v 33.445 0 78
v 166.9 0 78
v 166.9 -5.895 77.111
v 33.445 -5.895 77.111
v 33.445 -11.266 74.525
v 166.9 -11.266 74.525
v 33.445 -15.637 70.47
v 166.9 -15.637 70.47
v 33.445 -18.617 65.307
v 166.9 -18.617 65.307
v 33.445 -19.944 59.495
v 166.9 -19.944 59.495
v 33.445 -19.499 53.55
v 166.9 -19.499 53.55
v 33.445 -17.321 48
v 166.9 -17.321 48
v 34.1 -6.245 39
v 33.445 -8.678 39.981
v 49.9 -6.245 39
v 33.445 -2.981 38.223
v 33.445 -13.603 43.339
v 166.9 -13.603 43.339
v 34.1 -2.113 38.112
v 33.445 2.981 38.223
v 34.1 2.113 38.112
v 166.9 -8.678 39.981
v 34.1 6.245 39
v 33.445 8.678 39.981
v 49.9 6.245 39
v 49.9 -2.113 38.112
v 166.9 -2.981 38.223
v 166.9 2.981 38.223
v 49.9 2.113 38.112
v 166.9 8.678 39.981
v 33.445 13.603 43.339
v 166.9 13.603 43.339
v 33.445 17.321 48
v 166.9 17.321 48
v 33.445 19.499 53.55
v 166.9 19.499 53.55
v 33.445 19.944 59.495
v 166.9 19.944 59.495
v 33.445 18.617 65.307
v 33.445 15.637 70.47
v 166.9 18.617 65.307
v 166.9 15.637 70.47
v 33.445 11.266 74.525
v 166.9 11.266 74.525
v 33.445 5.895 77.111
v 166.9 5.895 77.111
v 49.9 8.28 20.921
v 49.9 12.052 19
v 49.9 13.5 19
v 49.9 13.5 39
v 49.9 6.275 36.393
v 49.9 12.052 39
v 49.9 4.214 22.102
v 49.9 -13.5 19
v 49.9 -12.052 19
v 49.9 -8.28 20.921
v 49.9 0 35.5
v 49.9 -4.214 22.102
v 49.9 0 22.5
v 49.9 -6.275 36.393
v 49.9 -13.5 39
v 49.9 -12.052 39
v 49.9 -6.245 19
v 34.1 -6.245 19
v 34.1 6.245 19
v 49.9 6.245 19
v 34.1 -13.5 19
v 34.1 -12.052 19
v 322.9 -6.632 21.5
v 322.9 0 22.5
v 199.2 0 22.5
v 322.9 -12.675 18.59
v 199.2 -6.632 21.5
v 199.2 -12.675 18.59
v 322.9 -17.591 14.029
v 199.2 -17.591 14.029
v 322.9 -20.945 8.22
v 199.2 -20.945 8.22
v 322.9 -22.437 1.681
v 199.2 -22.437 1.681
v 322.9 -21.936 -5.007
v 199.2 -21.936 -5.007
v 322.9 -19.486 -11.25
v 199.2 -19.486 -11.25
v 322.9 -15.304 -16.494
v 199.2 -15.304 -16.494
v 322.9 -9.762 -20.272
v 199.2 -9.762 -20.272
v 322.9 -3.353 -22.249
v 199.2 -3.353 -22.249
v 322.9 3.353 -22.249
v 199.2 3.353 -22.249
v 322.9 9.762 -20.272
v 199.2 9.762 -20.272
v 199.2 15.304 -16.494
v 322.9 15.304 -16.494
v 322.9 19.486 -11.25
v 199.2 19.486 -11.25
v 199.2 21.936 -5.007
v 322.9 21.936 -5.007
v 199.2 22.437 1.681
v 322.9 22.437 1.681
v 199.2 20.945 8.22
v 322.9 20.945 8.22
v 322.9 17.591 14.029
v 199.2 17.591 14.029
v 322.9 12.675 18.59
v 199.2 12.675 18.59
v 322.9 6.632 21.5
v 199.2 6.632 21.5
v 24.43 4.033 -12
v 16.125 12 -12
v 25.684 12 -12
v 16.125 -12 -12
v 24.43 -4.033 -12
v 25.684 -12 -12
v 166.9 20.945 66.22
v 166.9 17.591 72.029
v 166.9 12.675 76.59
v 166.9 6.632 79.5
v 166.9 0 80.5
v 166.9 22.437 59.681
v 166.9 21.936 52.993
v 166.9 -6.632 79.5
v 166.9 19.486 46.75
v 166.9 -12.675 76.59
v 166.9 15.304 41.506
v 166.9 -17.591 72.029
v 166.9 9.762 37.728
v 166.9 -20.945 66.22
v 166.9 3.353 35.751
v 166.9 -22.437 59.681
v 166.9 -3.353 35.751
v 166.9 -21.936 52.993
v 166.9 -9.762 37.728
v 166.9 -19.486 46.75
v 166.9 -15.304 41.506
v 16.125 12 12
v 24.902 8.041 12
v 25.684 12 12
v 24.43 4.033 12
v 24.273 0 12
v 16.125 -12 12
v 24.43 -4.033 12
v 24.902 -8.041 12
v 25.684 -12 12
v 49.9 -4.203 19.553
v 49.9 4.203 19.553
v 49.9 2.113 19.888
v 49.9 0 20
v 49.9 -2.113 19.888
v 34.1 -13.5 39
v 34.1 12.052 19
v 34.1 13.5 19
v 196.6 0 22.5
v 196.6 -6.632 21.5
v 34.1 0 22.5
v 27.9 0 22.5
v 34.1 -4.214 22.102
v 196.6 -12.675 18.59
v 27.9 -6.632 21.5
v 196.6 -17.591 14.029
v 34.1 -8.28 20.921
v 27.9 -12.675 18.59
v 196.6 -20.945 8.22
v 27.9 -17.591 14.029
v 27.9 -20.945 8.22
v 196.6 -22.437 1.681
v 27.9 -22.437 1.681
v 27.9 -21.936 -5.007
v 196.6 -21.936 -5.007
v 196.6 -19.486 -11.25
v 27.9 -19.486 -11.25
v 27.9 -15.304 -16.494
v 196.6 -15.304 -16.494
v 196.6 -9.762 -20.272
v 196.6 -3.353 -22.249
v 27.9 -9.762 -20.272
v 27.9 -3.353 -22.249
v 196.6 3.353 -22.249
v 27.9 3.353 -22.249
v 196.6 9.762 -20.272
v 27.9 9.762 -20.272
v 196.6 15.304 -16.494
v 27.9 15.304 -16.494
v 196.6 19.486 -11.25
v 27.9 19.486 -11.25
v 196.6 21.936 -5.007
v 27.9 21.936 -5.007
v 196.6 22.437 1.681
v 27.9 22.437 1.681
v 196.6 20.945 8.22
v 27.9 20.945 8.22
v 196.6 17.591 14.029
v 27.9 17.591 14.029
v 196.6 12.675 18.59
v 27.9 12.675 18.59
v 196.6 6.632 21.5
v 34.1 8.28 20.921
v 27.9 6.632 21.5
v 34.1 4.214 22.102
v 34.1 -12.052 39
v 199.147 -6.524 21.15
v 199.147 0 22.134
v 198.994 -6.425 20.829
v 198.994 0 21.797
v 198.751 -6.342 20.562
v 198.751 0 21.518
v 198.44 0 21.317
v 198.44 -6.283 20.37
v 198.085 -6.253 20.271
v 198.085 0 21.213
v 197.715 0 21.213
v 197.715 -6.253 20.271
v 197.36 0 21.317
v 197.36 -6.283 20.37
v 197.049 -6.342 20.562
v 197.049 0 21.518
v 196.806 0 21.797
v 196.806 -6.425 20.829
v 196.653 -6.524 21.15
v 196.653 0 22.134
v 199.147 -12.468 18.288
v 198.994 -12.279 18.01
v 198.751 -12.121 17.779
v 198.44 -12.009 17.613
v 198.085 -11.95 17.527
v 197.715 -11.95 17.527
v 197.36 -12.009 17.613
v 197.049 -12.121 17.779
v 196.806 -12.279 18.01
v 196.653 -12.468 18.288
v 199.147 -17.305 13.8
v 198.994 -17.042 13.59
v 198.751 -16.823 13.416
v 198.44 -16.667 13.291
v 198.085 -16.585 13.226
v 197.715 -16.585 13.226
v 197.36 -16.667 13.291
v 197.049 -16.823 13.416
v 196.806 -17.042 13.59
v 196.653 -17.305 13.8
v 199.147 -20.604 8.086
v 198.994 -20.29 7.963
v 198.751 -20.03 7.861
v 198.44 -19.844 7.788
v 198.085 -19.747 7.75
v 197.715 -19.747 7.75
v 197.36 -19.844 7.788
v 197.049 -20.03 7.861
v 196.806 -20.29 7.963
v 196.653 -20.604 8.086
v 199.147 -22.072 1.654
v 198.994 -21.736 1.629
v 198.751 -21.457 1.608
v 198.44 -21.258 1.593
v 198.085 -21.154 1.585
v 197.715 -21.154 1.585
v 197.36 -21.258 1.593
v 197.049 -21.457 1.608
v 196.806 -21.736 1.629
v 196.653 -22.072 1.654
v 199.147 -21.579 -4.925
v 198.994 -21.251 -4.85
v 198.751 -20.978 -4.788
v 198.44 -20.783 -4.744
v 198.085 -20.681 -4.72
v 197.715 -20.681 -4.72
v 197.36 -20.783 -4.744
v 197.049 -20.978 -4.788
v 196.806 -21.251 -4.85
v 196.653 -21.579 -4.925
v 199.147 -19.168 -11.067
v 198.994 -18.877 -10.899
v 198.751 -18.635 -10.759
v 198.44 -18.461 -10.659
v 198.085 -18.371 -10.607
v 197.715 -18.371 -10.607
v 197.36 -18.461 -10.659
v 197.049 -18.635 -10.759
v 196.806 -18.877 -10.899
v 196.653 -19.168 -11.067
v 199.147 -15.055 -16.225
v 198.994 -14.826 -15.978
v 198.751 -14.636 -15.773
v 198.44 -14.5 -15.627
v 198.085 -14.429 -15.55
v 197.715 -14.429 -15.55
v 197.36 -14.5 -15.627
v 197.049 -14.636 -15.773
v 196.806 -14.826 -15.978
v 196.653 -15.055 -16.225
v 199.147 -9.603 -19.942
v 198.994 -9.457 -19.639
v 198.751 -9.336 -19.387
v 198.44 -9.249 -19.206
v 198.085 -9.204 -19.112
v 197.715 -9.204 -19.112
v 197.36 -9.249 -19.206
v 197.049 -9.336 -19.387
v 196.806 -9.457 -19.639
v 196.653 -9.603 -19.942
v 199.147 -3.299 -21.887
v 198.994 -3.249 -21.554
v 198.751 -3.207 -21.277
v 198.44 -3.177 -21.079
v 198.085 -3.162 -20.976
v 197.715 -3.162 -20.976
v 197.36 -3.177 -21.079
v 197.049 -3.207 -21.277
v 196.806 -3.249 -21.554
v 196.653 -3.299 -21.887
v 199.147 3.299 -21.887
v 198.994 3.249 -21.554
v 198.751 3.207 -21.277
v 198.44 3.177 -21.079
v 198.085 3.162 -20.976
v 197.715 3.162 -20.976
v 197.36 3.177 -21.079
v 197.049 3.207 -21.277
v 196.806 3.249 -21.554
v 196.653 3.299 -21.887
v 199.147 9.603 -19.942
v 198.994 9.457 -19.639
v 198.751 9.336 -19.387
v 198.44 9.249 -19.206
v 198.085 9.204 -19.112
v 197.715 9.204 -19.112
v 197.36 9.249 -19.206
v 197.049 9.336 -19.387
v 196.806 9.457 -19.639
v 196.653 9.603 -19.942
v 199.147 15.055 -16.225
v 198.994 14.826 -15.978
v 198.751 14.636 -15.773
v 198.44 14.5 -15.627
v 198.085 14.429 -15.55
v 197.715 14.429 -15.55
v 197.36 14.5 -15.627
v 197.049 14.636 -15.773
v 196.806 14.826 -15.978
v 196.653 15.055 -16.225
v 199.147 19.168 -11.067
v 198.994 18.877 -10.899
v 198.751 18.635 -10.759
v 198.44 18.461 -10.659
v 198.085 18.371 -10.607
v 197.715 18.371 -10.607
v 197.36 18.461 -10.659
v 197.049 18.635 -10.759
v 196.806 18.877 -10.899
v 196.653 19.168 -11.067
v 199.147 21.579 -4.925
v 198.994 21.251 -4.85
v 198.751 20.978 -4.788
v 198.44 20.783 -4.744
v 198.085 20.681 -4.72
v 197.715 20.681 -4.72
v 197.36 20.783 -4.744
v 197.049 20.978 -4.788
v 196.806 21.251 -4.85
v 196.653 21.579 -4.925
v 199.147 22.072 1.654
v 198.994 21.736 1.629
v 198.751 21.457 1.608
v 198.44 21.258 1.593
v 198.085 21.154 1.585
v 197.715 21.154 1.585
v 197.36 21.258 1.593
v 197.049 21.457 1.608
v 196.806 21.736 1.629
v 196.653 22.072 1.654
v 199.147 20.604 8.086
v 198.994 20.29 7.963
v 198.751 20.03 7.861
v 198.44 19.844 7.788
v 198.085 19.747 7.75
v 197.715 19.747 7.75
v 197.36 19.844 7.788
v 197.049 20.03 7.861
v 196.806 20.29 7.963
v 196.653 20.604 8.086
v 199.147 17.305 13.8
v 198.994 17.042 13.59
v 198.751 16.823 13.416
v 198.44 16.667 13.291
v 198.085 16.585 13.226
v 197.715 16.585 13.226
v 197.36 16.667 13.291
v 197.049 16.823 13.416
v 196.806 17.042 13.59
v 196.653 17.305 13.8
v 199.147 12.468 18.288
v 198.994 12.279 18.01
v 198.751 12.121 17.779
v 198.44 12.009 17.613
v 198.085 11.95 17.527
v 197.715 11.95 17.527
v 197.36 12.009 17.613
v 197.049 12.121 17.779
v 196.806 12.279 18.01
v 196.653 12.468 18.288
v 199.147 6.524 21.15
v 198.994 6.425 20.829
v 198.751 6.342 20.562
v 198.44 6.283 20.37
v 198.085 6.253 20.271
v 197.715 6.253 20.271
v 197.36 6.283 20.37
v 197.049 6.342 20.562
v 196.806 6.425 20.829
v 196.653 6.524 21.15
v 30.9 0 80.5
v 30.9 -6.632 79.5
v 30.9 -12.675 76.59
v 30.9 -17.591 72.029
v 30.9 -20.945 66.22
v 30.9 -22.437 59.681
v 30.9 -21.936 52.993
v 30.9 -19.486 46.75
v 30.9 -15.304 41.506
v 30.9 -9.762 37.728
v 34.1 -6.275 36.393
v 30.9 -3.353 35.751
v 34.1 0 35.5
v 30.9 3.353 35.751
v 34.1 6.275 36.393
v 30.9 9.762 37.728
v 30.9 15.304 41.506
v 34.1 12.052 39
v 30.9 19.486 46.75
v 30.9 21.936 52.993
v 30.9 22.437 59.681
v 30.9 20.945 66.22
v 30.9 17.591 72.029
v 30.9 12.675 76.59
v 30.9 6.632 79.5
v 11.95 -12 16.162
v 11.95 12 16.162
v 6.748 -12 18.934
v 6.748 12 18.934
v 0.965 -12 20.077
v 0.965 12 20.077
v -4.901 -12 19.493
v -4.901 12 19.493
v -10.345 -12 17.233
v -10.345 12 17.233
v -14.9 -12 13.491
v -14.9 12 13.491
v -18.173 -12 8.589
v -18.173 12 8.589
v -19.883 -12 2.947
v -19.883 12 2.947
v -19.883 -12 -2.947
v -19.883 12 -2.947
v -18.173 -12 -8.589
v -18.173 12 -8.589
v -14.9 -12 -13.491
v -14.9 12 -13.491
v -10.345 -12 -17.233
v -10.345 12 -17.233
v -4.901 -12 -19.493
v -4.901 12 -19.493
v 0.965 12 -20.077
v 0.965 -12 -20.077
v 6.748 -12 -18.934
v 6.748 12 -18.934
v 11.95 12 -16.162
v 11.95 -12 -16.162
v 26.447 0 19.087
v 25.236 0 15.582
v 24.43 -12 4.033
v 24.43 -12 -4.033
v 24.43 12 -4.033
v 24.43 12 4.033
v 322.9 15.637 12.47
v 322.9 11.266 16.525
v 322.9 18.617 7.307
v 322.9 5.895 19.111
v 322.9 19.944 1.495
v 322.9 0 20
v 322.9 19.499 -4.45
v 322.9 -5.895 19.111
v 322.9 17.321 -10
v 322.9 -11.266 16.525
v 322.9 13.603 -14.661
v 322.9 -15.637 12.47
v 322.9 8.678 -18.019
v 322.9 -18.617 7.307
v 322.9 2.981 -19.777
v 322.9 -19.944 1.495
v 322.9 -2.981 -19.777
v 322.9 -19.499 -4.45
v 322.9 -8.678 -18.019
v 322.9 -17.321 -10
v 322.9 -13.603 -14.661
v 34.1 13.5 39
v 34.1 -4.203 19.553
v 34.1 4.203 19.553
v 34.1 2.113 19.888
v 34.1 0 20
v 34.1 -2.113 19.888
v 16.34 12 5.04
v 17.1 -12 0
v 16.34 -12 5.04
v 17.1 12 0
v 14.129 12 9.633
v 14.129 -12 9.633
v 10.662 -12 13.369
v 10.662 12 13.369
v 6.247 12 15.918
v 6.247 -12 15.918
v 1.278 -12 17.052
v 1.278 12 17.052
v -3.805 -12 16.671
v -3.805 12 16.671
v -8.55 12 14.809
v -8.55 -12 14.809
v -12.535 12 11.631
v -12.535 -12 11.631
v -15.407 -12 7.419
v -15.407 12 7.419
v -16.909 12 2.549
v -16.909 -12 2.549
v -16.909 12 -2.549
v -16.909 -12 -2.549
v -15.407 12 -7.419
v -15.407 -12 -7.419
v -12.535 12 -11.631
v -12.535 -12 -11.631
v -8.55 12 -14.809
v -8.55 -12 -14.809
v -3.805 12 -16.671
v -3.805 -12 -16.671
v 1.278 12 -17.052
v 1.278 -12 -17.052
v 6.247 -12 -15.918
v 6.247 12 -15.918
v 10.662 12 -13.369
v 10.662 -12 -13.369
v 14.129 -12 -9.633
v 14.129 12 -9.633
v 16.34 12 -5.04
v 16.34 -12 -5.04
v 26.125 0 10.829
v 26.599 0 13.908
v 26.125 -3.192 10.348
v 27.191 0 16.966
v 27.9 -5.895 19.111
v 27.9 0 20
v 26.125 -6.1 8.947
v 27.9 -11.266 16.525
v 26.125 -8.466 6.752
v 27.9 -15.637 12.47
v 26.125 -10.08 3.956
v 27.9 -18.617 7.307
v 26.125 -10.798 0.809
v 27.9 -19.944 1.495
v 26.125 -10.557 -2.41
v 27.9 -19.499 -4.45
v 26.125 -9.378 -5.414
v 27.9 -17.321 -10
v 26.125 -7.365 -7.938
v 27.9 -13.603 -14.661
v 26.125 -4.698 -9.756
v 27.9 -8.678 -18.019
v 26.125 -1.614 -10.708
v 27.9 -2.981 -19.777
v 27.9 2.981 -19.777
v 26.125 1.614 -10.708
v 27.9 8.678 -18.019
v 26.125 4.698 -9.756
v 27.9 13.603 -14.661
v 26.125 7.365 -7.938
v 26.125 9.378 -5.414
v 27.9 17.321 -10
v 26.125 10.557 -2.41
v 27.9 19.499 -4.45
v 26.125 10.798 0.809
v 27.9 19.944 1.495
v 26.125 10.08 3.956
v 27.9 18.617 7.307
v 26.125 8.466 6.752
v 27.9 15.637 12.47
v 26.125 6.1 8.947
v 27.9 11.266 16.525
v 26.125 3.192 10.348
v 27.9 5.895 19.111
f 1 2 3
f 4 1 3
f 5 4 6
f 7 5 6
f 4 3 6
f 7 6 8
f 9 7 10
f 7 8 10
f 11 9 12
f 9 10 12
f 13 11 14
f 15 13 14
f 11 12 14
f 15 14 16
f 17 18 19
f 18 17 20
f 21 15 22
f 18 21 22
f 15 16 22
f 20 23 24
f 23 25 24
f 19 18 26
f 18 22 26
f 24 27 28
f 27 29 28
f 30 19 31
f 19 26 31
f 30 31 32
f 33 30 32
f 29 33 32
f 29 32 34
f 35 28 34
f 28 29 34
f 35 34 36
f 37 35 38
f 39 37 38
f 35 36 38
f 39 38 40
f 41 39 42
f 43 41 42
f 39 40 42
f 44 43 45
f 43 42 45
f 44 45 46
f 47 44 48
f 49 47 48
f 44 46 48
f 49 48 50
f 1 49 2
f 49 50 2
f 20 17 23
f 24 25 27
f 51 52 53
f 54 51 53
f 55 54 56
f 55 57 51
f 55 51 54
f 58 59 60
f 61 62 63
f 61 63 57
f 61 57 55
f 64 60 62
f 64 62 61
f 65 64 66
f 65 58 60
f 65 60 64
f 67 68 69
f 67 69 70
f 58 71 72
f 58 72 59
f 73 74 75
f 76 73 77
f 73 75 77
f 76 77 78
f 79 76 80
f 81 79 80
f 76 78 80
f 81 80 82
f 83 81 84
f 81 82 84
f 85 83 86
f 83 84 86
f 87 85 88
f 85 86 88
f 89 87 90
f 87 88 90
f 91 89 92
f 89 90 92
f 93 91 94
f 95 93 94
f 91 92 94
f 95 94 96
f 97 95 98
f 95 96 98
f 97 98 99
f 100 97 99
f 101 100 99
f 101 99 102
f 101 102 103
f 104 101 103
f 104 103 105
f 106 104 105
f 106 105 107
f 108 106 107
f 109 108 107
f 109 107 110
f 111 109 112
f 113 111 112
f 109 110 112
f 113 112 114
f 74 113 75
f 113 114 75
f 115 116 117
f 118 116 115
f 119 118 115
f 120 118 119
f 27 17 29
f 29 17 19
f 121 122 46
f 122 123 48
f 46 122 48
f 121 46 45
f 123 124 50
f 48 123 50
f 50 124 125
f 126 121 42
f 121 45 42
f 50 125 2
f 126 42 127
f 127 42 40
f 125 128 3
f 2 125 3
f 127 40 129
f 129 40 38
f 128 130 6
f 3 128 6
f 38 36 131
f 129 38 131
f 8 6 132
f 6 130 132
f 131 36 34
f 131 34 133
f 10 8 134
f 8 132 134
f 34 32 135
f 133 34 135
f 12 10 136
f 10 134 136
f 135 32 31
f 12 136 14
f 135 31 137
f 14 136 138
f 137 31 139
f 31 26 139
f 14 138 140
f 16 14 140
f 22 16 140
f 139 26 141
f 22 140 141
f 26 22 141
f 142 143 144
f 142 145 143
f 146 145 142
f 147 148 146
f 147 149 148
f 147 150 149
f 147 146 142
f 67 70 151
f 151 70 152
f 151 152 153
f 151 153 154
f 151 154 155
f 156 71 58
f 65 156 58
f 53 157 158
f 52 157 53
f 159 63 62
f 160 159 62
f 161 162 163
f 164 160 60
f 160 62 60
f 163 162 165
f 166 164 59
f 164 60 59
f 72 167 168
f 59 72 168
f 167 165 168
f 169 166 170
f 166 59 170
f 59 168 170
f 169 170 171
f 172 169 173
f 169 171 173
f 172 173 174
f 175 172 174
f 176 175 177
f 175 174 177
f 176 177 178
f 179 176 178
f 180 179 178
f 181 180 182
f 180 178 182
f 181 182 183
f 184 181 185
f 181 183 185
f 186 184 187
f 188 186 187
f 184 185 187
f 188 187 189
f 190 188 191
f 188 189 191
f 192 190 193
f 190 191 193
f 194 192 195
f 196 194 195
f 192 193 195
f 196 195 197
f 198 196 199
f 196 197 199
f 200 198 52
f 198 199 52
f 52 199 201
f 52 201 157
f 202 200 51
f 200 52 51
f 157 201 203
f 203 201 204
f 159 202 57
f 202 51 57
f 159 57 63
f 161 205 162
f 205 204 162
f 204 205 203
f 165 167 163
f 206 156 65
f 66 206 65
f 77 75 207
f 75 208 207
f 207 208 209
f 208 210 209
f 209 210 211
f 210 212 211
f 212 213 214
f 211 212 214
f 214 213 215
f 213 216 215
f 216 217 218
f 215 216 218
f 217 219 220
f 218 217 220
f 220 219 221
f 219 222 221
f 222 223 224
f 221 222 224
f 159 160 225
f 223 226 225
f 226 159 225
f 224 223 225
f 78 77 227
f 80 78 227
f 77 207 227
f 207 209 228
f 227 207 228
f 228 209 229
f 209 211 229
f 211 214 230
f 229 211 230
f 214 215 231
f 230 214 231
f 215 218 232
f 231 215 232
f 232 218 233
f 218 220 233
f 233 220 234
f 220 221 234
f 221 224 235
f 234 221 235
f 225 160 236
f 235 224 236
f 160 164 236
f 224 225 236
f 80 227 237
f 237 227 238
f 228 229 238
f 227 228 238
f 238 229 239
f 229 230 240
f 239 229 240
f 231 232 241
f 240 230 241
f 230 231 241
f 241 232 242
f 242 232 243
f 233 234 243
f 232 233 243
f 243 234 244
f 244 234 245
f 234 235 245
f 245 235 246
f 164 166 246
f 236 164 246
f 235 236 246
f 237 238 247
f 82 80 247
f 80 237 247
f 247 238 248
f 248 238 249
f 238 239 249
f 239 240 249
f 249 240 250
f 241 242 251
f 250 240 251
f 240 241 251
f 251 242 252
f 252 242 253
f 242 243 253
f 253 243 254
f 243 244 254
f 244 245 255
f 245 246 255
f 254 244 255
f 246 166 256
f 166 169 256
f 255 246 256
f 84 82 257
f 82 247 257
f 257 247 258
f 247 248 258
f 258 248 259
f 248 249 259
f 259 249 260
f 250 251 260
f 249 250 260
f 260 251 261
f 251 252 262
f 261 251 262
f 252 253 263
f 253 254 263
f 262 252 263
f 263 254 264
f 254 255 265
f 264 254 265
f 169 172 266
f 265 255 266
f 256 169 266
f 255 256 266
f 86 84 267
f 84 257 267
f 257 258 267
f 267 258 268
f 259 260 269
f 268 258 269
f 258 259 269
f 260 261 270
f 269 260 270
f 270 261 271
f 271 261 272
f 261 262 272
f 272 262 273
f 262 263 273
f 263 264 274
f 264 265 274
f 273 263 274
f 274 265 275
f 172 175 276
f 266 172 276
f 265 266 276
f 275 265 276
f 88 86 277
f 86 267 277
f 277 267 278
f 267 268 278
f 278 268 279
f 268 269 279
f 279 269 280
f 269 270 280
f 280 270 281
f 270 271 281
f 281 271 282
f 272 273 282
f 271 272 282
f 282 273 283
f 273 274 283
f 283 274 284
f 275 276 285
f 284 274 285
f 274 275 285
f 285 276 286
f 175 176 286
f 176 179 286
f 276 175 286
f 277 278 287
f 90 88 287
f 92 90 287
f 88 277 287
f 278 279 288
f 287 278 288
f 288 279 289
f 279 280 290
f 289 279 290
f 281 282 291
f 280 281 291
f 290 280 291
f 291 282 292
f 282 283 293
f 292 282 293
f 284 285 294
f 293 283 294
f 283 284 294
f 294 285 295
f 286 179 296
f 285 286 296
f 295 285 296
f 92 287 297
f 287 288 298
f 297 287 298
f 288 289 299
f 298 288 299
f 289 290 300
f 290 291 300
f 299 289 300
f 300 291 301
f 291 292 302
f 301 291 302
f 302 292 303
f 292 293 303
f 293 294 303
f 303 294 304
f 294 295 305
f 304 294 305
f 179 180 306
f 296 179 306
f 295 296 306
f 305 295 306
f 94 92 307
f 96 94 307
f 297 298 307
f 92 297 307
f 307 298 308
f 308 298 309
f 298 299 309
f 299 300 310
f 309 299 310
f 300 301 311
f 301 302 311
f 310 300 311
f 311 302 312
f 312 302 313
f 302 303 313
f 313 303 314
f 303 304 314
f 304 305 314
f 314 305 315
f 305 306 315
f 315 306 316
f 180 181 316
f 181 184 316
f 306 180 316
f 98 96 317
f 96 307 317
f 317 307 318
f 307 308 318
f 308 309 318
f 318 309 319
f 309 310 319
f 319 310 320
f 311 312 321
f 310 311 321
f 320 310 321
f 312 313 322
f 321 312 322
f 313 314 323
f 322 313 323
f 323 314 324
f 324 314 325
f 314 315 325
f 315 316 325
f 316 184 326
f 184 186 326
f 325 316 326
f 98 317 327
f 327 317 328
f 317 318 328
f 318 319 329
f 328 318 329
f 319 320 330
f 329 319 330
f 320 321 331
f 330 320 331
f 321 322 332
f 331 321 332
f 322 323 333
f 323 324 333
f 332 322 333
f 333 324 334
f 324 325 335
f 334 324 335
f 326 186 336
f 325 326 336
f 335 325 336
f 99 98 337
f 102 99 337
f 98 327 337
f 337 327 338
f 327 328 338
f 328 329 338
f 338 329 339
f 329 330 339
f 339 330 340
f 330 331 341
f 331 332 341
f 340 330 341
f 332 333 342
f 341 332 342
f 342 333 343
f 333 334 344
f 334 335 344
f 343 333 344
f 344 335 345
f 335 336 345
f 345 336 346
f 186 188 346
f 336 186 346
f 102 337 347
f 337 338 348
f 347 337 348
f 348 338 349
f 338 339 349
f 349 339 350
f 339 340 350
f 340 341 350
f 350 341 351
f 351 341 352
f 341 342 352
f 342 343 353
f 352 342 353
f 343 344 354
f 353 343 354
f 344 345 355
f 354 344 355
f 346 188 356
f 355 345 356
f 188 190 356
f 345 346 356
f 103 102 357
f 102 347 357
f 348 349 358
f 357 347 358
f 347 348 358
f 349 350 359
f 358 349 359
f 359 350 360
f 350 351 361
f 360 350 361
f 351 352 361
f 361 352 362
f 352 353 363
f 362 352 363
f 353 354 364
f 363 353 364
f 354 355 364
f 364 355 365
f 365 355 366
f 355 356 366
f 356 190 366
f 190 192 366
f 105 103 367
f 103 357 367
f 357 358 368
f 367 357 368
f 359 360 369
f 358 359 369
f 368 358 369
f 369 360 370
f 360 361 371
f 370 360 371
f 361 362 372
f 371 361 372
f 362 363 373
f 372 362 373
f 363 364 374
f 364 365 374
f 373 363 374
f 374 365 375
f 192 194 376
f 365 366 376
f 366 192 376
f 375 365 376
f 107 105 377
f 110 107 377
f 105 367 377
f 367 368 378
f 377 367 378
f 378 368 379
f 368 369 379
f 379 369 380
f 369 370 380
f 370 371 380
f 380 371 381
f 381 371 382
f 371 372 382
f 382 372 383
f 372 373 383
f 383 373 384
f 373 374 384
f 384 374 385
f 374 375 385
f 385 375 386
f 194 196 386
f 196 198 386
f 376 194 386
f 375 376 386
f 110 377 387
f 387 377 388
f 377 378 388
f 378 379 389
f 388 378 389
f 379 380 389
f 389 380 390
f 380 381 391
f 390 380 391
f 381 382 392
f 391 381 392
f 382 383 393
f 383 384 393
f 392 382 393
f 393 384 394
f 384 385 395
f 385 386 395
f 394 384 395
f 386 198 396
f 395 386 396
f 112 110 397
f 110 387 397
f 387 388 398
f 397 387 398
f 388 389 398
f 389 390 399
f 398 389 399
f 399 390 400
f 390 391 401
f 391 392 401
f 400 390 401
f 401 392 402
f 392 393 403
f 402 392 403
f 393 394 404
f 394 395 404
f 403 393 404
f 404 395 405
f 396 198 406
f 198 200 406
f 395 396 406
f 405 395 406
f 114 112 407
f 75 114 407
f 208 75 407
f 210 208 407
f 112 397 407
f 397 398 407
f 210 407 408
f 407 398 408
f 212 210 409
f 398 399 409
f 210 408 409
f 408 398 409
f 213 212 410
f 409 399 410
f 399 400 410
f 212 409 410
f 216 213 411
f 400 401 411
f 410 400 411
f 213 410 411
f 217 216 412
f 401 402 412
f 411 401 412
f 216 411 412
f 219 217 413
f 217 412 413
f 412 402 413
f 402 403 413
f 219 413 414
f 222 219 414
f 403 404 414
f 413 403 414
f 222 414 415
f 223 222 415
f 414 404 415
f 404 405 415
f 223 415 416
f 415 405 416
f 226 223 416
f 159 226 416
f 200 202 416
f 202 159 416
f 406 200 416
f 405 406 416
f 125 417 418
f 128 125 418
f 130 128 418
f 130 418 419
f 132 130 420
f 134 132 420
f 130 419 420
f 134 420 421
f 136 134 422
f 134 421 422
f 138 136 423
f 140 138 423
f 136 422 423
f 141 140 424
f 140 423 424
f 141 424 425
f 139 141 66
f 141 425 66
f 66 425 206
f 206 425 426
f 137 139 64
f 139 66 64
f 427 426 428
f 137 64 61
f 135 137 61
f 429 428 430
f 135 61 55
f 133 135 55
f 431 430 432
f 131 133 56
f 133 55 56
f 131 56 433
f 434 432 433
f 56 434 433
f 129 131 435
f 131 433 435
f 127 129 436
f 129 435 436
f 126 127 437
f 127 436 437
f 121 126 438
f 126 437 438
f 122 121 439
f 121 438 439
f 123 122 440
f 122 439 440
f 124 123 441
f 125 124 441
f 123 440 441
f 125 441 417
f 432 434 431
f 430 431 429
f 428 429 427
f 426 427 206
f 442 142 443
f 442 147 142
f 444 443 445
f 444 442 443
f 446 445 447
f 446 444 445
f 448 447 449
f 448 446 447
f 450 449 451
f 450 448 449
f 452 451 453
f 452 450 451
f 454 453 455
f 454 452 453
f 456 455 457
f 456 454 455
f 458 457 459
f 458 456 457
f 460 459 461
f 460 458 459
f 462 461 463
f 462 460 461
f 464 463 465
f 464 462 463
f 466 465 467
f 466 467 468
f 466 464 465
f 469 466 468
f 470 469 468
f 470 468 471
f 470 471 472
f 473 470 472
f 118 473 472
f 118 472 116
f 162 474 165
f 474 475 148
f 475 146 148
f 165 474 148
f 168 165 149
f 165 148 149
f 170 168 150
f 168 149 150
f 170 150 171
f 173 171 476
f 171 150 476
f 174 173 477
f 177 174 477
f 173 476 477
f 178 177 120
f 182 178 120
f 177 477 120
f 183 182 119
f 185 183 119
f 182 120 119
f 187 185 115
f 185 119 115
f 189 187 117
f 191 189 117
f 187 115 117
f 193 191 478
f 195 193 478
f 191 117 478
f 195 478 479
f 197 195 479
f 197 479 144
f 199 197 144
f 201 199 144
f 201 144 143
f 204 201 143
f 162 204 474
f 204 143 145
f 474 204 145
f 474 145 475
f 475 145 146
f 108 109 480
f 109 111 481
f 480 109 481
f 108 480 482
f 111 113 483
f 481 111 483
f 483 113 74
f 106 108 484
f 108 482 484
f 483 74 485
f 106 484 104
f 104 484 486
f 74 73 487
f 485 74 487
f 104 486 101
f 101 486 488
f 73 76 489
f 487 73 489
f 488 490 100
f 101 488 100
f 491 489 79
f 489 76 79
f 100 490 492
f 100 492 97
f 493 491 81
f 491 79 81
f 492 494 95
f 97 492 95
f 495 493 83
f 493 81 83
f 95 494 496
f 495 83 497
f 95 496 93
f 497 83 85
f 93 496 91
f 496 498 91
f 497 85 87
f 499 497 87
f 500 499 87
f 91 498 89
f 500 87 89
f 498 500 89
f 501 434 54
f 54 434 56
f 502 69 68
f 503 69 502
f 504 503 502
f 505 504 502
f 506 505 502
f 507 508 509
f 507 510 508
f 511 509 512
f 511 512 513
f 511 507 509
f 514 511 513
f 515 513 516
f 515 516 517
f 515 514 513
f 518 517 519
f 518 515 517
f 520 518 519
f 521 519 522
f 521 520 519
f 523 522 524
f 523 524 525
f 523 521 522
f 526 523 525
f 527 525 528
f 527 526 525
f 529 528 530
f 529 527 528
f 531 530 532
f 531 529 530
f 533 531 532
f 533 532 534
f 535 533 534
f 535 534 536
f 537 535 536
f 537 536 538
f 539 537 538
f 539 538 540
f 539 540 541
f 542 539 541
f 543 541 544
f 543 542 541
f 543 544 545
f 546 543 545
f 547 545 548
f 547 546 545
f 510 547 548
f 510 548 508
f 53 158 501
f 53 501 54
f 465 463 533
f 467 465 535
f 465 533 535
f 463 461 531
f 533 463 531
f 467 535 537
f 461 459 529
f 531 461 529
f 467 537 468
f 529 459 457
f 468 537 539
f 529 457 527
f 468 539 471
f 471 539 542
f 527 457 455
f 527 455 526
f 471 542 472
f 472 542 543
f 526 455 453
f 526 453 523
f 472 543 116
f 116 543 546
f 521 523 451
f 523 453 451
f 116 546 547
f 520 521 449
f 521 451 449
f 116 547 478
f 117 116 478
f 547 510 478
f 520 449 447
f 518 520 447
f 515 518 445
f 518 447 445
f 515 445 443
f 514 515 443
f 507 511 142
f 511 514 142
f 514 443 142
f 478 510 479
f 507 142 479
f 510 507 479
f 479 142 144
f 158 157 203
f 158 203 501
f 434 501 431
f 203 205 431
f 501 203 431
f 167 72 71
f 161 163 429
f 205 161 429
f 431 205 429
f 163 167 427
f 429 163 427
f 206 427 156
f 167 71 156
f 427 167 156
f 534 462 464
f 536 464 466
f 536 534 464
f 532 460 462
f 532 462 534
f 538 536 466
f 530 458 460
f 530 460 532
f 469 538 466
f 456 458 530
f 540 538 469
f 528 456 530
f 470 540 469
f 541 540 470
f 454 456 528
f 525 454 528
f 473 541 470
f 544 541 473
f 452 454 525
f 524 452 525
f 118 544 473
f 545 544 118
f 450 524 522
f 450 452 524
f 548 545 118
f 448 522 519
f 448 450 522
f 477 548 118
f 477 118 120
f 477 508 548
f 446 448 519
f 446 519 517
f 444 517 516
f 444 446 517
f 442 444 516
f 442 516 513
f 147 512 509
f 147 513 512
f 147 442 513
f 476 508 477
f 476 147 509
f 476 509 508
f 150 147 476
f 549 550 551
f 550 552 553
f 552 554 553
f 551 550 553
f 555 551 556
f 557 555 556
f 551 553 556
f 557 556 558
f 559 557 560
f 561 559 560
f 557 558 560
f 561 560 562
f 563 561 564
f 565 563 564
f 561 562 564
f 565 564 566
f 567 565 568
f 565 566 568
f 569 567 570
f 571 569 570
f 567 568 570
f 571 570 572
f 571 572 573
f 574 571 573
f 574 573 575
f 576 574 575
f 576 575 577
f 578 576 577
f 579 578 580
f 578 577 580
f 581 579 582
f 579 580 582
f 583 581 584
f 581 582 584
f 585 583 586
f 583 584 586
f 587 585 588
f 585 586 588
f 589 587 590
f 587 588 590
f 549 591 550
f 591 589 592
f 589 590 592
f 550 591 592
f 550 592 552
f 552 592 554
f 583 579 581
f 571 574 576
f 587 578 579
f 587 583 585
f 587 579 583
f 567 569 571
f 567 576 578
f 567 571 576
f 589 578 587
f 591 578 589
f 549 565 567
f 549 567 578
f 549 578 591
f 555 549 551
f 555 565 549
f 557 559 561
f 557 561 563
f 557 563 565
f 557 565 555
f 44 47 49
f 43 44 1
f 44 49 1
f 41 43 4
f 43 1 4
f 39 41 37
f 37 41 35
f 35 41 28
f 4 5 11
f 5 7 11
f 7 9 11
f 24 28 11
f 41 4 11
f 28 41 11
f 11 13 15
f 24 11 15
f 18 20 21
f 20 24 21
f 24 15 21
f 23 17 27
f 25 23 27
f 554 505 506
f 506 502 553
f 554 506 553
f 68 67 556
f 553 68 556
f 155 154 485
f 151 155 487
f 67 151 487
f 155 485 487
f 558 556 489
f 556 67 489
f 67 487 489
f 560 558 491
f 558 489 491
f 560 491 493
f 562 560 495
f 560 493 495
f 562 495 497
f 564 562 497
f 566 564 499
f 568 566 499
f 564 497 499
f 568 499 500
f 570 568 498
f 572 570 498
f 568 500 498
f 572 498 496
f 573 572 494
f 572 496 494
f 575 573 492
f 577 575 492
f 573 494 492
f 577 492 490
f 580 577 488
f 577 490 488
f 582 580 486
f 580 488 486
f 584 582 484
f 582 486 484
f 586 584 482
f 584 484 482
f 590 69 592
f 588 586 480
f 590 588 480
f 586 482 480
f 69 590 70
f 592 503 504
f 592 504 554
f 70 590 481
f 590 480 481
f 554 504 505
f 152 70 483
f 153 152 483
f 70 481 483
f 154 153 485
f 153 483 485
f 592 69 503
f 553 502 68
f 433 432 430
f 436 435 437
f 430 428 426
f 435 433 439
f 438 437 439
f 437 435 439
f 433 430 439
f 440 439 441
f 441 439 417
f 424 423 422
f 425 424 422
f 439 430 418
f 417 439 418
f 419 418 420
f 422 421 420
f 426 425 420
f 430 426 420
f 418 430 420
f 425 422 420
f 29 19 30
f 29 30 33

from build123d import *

# Parameters (mm, degrees)
F2_R     = 17.1
F3_DEPTH = 12
F6_W     = 15.8
F6_H     = 20
F7_DEPTH = 13.5


with BuildPart() as f1:
    # F0 (on Front) → F1 (revolve)
    with BuildSketch(Plane.XZ):
        with BuildLine():
            Line((27.9, 20), (322.9, 20))
            Line((322.9, 20), (322.9, 22.5))
            Line((322.9, 22.5), (199.2, 22.5))
            ThreePointArc((199.2, 22.5), (197.9, 21.2), (196.6, 22.5))
            Line((196.6, 22.5), (27.9, 22.5))
            Line((27.9, 22.5), (27.9, 20))
        make_face()
        with BuildLine():
            ThreePointArc((25.4, 0), (26.027422517, 10.0778221854), (27.9, 20))
            Line((27.9, 20), (27.9, 22.5))
            ThreePointArc((27.9, 22.5), (24.1650624277, 11.5244305716), (22.9, 0))
            Line((22.9, 0), (25.4, 0))
        make_face()
    revolve(axis=Axis((175.4, 0, 0), (1, 0, 0)))

    # F2 (on Front) → F3 (join, symmetric)
    with BuildSketch(Plane.XZ):
        with BuildLine():
            ThreePointArc((16.1248255805, -12), (19.0803432119, -6.320641021), (20.1, 0))
            ThreePointArc((20.1, 0), (19.0803432119, 6.320641021), (16.1248255805, 12))
            ThreePointArc((16.1248255805, 12), (-20.1, 0), (16.1248255805, -12))
        make_face()
        Circle(F2_R, mode=Mode.SUBTRACT)
        with BuildLine():
            ThreePointArc((16.1248255805, 12), (19.0803432119, 6.320641021), (20.1, 0))
            ThreePointArc((20.1, 0), (19.0803432119, -6.320641021), (16.1248255805, -12))
            Line((16.1248255805, -12), (26.1248255805, -12))
            Line((26.1248255805, -12), (26.1248255805, 12))
            Line((26.1248255805, 12), (16.1248255805, 12))
        make_face()
    extrude(amount=F3_DEPTH, both=True)



with BuildPart() as f5:
    # F4 (on Front) → F5 (revolve)
    with BuildSketch(Plane.XZ):
        Polygon((33.445, 78), (166.9, 78), (166.9, 80.5), (30.9, 80.5), (30.9, 58), (33.445, 58), align=None)
    revolve(axis=Axis((98.9, 0, 58), (1, 0, 0)))


with BuildPart() as f1_1:
    add(f1.part)

    add(f5.part)  # F7 merges F5
    # F6 (on Front) → F7 (join, symmetric)
    with BuildSketch(Plane.XZ):
        with Locations((42, 29)):
            Rectangle(F6_W, F6_H)
    extrude(amount=F7_DEPTH, both=True)


solid = f1_1.part
